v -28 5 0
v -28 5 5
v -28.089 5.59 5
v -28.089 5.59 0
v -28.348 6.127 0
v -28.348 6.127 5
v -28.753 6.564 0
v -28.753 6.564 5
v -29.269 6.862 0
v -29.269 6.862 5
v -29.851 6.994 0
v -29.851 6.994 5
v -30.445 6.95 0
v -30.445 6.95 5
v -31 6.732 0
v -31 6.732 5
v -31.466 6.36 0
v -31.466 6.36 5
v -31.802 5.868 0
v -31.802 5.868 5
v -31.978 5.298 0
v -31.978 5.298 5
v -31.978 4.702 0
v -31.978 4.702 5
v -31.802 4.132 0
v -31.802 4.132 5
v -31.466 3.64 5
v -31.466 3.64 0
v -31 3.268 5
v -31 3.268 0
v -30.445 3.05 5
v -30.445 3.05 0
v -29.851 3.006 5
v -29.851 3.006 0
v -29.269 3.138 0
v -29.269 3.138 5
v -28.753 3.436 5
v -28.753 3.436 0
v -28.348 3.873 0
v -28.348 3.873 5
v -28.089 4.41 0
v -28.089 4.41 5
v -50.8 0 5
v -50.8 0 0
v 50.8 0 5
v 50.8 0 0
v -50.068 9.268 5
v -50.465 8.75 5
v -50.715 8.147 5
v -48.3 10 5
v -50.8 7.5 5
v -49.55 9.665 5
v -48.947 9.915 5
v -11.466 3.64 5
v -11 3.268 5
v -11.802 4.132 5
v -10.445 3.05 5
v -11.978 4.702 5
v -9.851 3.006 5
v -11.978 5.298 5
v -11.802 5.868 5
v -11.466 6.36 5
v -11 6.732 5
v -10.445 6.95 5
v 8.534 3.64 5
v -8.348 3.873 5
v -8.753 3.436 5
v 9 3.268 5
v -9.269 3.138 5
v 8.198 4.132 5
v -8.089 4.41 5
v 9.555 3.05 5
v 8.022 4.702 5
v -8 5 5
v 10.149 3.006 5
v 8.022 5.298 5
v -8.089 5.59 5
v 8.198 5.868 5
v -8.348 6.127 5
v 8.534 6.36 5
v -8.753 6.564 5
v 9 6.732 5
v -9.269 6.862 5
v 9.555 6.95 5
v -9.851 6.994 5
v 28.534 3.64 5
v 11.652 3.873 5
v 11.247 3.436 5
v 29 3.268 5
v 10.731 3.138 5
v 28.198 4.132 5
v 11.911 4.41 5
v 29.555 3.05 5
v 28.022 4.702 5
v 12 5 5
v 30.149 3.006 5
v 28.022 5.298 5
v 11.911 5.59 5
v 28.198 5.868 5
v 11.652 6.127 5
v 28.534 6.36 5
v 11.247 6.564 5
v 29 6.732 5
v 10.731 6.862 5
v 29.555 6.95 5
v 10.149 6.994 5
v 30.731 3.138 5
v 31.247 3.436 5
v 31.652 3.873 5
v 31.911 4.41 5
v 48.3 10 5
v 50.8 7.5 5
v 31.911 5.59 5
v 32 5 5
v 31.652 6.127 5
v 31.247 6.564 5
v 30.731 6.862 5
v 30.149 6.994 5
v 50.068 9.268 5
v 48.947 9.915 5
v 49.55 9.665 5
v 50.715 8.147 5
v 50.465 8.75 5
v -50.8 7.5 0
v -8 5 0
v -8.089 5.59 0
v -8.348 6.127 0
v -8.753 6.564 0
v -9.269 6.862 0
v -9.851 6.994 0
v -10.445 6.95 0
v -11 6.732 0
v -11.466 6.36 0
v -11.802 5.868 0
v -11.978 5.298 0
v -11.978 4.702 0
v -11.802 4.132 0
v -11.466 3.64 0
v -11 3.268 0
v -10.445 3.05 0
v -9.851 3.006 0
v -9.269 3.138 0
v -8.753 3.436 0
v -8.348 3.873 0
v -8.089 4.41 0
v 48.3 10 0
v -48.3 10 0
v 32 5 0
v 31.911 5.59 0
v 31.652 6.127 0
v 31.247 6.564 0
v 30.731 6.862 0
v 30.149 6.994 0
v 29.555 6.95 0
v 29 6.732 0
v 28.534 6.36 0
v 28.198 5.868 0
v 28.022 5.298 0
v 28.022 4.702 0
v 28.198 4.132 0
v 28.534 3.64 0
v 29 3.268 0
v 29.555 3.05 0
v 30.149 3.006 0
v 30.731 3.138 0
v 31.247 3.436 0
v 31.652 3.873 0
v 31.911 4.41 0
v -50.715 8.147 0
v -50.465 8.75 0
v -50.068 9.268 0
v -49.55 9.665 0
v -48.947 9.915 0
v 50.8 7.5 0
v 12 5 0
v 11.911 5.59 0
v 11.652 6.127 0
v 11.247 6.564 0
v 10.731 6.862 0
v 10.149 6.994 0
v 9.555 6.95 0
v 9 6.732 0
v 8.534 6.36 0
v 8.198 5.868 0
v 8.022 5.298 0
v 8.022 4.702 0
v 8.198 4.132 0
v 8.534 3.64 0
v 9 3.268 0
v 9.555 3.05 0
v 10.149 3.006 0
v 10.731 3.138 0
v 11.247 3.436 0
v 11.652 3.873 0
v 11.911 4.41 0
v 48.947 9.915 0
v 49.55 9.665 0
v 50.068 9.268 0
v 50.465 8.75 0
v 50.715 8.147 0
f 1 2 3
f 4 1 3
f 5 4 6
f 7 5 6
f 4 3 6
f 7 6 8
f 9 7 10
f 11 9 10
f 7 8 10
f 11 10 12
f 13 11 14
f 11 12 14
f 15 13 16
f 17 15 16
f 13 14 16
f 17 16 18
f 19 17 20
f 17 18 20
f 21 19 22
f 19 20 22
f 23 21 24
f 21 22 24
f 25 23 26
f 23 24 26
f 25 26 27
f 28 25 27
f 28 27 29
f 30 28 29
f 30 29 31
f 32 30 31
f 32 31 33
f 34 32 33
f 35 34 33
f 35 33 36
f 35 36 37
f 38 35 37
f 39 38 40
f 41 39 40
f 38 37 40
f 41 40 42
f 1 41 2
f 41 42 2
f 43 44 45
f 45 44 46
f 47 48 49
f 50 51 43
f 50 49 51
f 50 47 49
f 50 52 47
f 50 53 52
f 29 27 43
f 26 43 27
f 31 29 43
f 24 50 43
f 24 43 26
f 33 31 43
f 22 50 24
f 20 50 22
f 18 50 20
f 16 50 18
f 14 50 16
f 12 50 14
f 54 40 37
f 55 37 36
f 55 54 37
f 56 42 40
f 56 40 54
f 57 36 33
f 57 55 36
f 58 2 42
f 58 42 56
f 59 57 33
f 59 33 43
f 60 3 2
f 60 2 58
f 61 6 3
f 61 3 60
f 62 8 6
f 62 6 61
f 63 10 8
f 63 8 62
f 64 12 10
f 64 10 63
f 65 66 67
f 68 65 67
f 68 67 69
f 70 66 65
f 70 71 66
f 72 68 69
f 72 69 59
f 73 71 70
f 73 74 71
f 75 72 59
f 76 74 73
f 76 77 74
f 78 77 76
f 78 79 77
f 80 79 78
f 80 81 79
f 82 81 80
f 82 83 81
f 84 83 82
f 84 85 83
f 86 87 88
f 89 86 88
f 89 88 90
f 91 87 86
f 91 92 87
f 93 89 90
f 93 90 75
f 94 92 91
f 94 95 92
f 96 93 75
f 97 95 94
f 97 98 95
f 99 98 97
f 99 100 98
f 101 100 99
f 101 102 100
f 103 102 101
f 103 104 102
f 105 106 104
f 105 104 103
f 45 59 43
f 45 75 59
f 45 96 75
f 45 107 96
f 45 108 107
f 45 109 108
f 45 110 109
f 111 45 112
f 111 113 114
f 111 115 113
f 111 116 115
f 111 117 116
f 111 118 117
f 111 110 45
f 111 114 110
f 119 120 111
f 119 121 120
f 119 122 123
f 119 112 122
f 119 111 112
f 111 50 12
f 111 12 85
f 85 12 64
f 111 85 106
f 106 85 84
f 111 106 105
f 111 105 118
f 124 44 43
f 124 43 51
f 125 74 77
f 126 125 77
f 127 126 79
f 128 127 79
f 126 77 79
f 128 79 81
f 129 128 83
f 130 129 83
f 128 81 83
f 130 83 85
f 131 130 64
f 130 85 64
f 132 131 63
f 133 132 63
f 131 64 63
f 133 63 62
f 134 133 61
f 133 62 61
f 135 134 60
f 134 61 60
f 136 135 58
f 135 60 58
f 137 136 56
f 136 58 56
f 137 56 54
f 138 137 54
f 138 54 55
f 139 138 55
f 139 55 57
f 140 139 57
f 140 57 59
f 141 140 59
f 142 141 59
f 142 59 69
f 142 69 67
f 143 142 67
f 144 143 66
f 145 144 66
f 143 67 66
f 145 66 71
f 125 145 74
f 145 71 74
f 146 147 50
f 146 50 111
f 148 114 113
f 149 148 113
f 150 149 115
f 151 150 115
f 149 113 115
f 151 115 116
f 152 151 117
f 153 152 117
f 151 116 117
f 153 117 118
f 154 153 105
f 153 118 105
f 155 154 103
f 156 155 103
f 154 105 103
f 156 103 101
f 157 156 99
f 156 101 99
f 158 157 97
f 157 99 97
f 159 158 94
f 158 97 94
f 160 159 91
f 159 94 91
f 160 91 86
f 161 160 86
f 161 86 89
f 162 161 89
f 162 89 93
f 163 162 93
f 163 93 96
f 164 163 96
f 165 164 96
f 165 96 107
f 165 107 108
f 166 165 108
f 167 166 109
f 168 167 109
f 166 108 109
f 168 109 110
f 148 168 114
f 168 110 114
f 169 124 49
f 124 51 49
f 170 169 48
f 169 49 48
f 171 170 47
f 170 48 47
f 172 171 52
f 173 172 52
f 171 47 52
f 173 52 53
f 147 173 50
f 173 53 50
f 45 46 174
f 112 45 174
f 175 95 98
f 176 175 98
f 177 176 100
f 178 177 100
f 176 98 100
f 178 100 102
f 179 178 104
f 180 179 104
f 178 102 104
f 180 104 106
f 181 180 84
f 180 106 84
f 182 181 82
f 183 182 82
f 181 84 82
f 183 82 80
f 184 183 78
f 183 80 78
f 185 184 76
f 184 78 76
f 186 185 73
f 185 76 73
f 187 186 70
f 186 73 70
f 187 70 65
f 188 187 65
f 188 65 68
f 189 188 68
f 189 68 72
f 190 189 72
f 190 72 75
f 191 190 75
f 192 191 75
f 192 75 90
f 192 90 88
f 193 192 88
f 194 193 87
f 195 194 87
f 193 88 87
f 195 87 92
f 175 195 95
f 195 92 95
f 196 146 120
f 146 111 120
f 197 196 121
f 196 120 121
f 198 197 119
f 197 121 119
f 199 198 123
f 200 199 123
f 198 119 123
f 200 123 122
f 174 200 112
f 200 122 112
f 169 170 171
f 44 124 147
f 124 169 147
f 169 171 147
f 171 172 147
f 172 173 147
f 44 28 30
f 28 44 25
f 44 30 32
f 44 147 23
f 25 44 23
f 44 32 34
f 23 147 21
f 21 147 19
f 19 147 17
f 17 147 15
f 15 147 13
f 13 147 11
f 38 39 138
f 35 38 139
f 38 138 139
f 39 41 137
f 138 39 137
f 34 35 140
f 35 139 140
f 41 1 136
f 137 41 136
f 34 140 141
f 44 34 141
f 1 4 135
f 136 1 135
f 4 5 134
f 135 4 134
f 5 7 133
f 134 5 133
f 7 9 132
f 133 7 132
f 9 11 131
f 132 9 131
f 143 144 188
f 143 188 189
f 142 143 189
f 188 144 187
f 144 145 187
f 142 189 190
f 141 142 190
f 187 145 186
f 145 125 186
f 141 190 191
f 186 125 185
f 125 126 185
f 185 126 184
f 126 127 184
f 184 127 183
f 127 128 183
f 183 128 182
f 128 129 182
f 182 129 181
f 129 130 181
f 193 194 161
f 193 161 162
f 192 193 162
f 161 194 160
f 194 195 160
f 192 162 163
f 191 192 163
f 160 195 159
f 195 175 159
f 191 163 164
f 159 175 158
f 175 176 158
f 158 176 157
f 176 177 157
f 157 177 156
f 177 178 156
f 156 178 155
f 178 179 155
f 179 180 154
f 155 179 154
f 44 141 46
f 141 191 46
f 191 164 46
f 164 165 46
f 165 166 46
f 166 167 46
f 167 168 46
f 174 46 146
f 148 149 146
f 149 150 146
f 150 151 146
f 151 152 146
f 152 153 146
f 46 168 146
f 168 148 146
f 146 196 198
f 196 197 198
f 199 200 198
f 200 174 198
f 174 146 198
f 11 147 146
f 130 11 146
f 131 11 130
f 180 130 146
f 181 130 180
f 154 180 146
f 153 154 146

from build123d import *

# Parameters (mm, degrees)
SKETCH1_W           = 101.6
SKETCH1_H           = 10
BOSS_EXTRUDE1_DEPTH = 5
SKETCH2_R           = 2
CUT_EXTRUDE1_DEPTH  = 5
FILLET1_R           = 2.5


with BuildPart() as part:
    # Sketch1 → Boss-Extrude1 (new body)
    with BuildSketch(Plane.XY):
        with Locations((0, 5)):
            Rectangle(SKETCH1_W, SKETCH1_H)
    extrude(amount=BOSS_EXTRUDE1_DEPTH)

    # Sketch2 → Cut-Extrude1 (cut)
    with BuildSketch(Plane.XY.offset(5)):
        with Locations((-30, 5)):
            Circle(SKETCH2_R)
        with Locations((-10, 5)):
            Circle(SKETCH2_R)
        with Locations((10, 5)):
            Circle(SKETCH2_R)
        with Locations((30, 5)):
            Circle(SKETCH2_R)
    extrude(amount=-CUT_EXTRUDE1_DEPTH, mode=Mode.SUBTRACT)

    # Fillet1
    fillet1_edges = [part.edges().sort_by_distance(p)[0] for p in [
        (-50.8, 10, 2.5),
        (50.8, 10, 2.5),
    ]]
    fillet(fillet1_edges, radius=FILLET1_R)


solid = part.part
